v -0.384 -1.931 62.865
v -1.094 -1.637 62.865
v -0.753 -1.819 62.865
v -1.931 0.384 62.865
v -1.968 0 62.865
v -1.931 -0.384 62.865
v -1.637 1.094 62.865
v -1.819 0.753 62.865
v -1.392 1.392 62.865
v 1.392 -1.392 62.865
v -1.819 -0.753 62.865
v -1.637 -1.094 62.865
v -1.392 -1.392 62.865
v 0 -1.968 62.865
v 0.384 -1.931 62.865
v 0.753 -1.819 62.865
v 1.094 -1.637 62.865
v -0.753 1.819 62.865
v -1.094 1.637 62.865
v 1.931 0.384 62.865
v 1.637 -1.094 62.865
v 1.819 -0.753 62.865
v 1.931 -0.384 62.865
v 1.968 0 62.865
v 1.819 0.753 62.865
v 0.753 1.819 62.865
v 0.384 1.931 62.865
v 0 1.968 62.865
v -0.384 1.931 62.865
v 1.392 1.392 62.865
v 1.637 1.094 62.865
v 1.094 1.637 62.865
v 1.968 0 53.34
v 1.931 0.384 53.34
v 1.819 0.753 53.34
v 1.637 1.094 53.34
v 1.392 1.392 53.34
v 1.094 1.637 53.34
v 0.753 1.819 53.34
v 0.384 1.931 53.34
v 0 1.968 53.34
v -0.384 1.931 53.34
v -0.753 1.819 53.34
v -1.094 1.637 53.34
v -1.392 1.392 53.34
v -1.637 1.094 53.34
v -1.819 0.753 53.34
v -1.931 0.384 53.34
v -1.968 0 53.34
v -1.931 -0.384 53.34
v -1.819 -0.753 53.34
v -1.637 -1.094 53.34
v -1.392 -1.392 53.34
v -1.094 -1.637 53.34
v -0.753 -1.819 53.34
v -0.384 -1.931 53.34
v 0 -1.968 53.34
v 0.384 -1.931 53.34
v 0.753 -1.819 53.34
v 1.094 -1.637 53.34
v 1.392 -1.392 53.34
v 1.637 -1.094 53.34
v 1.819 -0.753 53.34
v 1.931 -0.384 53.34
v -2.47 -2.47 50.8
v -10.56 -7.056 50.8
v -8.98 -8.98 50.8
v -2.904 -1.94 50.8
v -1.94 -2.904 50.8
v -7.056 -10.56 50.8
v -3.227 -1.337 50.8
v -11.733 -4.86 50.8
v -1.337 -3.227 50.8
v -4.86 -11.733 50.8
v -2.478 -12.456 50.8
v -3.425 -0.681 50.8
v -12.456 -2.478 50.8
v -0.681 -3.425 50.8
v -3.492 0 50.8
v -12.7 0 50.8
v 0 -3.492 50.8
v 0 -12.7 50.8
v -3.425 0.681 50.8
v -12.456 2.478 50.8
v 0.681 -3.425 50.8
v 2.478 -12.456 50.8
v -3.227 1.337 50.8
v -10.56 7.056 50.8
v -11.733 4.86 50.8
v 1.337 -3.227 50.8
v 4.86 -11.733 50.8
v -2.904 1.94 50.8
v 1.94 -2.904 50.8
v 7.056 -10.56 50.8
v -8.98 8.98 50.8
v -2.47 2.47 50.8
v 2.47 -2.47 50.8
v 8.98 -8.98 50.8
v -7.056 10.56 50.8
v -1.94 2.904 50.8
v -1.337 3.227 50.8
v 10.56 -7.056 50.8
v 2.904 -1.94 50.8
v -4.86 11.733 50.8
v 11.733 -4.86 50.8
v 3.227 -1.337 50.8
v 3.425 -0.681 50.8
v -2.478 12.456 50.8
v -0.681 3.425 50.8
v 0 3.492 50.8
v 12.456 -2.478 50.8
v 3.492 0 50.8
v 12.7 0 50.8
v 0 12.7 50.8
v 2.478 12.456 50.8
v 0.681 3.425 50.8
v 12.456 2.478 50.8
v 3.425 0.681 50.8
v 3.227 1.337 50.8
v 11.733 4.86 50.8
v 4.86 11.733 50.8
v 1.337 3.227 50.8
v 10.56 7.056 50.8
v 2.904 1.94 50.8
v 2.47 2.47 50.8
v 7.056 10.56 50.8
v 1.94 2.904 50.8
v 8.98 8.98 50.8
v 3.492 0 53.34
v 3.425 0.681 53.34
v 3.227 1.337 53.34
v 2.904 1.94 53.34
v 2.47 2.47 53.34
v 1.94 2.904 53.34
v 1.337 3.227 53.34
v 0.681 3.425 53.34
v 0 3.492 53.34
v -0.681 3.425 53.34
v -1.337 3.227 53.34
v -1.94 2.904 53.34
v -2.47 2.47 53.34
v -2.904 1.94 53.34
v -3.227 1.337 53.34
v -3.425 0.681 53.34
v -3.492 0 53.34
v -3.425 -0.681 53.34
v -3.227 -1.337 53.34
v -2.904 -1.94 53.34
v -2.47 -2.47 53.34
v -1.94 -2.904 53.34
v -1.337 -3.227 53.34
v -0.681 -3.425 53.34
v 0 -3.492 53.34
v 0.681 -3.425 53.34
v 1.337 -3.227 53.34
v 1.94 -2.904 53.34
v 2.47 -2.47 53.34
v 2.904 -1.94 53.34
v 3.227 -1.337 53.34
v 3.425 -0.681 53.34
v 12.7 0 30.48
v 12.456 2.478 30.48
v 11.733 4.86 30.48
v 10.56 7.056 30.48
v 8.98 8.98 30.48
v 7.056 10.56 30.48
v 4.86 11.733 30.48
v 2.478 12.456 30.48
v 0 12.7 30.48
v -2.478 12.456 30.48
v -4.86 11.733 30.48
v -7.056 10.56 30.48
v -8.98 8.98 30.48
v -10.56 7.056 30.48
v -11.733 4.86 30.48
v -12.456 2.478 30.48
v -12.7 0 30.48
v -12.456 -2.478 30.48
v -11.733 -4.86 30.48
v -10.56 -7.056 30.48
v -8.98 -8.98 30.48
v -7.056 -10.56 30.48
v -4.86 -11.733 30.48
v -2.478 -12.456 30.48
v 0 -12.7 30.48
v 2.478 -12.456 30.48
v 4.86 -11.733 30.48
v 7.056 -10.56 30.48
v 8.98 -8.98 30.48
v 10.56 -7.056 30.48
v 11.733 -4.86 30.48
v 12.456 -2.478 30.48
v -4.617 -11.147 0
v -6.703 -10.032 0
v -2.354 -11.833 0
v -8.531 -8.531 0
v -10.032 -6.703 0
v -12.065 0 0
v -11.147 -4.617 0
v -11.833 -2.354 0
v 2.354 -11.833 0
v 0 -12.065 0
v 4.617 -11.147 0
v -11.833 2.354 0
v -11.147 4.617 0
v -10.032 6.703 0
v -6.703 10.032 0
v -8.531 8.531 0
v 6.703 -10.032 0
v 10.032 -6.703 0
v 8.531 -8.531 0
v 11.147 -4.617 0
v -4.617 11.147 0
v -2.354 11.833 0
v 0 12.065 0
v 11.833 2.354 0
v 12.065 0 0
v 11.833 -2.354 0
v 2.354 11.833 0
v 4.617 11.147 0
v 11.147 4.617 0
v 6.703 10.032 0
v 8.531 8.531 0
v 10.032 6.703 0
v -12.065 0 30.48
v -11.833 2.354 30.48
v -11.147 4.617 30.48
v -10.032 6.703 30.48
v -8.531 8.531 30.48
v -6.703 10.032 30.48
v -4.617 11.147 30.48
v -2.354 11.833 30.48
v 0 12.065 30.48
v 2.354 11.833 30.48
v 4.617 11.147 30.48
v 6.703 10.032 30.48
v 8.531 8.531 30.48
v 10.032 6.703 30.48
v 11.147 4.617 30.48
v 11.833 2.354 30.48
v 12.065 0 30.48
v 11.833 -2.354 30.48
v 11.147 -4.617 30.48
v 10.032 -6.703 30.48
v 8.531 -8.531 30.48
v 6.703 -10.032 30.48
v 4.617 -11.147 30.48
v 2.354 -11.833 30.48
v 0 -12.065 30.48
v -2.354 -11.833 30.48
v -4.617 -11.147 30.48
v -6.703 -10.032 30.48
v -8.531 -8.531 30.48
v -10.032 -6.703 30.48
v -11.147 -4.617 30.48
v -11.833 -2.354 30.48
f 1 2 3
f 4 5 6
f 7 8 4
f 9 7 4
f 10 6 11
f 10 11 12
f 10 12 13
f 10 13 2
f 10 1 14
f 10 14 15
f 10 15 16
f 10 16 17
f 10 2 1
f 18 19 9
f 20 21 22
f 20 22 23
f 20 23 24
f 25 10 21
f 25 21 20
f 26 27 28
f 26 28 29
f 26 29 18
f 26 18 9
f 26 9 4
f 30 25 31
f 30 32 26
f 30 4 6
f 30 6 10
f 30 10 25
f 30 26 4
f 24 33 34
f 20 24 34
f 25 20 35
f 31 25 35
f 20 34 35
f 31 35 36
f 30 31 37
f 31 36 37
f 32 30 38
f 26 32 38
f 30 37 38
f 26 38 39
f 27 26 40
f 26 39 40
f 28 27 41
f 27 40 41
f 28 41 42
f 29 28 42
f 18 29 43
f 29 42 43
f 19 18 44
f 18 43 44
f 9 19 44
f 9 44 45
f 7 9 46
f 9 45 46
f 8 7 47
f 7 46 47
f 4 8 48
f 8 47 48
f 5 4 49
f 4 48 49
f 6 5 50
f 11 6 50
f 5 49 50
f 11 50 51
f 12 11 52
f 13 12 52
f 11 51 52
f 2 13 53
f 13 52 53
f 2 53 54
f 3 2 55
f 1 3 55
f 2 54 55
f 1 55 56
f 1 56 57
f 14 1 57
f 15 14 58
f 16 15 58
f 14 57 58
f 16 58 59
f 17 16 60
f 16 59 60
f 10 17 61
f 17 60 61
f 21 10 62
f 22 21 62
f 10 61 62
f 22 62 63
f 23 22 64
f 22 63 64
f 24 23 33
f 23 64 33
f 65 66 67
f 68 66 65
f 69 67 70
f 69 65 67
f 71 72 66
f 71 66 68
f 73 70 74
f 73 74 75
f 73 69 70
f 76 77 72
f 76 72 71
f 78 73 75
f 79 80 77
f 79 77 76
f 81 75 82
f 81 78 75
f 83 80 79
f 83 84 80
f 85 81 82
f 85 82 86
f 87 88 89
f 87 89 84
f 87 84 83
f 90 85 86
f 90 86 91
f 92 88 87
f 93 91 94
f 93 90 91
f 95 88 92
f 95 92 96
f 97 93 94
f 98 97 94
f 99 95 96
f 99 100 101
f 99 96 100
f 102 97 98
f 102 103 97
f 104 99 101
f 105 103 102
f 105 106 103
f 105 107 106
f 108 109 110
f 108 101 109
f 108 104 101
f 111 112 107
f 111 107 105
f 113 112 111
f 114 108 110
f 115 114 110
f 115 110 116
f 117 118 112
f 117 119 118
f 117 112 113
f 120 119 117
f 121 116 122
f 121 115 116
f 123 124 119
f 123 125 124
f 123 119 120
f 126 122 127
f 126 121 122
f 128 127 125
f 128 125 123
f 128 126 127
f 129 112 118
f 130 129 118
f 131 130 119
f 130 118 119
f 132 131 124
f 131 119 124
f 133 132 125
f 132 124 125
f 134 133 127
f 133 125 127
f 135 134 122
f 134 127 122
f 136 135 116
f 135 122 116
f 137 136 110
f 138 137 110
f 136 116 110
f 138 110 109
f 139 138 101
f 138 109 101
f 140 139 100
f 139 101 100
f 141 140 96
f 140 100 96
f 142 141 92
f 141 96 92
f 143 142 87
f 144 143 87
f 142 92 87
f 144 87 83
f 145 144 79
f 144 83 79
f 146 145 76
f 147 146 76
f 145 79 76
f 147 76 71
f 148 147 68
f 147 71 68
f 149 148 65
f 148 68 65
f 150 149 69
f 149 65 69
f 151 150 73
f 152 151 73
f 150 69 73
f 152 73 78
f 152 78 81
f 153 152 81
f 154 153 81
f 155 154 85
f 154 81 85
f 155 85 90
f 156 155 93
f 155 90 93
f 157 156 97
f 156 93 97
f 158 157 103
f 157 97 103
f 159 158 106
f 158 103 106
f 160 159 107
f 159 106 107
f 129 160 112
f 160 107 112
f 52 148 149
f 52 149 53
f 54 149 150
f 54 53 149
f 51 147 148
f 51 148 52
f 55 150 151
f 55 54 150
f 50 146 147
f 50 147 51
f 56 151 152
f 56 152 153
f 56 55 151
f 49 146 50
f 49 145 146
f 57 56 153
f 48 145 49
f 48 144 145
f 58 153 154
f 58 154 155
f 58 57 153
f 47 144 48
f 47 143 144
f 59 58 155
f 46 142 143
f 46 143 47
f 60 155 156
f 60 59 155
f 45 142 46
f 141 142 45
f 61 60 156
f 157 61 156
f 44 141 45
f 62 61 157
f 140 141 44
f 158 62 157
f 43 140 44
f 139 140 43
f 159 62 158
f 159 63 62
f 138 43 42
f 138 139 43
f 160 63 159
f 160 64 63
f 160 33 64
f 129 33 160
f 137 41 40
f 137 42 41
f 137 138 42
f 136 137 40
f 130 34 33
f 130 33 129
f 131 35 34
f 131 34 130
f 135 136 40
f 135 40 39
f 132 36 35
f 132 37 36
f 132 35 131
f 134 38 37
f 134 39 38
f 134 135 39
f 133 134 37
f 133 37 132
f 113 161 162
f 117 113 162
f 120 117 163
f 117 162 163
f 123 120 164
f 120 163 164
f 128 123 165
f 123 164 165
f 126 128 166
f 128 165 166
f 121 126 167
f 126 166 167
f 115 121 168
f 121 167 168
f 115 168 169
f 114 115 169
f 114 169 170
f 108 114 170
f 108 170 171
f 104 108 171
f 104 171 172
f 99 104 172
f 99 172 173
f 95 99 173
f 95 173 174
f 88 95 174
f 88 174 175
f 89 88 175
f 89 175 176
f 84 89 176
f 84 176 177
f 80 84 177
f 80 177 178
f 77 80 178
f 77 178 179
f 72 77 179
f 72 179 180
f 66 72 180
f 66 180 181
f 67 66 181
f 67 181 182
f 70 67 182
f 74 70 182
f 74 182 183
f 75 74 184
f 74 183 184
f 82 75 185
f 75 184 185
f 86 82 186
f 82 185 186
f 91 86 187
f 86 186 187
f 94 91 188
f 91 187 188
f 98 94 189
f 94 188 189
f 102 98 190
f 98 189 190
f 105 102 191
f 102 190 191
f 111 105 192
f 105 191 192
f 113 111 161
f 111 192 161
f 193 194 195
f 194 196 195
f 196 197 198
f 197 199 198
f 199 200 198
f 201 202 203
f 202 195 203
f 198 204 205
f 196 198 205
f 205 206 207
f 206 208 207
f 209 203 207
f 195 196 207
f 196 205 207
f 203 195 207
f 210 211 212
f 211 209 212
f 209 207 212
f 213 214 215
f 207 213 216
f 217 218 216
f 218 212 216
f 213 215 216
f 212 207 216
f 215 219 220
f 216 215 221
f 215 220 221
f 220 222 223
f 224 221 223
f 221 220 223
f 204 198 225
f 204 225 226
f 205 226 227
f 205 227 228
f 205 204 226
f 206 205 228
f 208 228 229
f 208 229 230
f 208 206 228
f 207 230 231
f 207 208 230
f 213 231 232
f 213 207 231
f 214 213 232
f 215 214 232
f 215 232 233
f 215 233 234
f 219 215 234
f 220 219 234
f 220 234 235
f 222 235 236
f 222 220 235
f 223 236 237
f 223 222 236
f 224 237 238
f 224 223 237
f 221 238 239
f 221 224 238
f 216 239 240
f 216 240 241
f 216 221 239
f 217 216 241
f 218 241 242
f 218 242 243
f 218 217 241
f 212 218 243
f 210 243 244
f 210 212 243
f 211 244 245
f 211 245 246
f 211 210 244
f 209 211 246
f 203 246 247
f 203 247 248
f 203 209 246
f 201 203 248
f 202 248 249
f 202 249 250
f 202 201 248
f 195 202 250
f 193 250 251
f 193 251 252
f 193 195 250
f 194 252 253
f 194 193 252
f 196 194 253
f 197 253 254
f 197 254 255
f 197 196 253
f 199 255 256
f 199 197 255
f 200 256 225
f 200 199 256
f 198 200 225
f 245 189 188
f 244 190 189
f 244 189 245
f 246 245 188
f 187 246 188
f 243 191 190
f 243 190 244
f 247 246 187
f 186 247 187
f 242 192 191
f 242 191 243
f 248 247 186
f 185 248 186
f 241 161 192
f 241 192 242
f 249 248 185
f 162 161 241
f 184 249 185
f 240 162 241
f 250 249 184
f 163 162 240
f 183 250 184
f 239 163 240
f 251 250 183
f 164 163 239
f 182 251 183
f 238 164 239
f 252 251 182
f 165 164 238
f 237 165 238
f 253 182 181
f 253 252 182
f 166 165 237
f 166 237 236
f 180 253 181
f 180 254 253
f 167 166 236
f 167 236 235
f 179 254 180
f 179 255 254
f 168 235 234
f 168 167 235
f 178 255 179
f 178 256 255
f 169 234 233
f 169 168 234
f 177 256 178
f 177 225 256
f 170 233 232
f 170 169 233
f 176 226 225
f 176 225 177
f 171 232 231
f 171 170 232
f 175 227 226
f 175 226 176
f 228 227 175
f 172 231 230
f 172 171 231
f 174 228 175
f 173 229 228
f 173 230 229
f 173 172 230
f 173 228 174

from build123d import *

# Parameters (mm, degrees)
SKETCH1_R           = 12.7
BOSS_EXTRUDE1_DEPTH = 50.8
SKETCH2_R           = 3.4925
BOSS_EXTRUDE2_DEPTH = 2.54
SKETCH3_R           = 1.9685
BOSS_EXTRUDE3_DEPTH = 9.525
SKETCH4_OUTSIDE_W   = 41.88
SKETCH4_OUTSIDE_H   = 41.88
SKETCH4_OUTSIDE_R   = 12.065
CUT_EXTRUDE1_DEPTH  = 30.48


with BuildPart() as part:
    # Sketch1 → Boss-Extrude1 (new body)
    with BuildSketch(Plane.XY):
        Circle(SKETCH1_R)
    extrude(amount=BOSS_EXTRUDE1_DEPTH)

    # Sketch2 → Boss-Extrude2 (add)
    with BuildSketch(Plane.XY.offset(50.8)):
        Circle(SKETCH2_R)
    extrude(amount=BOSS_EXTRUDE2_DEPTH)

    # Sketch3 → Boss-Extrude3 (add)
    with BuildSketch(Plane.XY.offset(53.34)):
        Circle(SKETCH3_R)
    extrude(amount=BOSS_EXTRUDE3_DEPTH)

    # Sketch4 outside → Cut-Extrude1 (cut)
    with BuildSketch(Plane(origin=(0, 0, 0), x_dir=(-1, 0, 0), z_dir=(0, 0, -1))):
        Rectangle(SKETCH4_OUTSIDE_W, SKETCH4_OUTSIDE_H)
        Circle(SKETCH4_OUTSIDE_R, mode=Mode.SUBTRACT)
    extrude(amount=-CUT_EXTRUDE1_DEPTH, mode=Mode.SUBTRACT)


solid = part.part
